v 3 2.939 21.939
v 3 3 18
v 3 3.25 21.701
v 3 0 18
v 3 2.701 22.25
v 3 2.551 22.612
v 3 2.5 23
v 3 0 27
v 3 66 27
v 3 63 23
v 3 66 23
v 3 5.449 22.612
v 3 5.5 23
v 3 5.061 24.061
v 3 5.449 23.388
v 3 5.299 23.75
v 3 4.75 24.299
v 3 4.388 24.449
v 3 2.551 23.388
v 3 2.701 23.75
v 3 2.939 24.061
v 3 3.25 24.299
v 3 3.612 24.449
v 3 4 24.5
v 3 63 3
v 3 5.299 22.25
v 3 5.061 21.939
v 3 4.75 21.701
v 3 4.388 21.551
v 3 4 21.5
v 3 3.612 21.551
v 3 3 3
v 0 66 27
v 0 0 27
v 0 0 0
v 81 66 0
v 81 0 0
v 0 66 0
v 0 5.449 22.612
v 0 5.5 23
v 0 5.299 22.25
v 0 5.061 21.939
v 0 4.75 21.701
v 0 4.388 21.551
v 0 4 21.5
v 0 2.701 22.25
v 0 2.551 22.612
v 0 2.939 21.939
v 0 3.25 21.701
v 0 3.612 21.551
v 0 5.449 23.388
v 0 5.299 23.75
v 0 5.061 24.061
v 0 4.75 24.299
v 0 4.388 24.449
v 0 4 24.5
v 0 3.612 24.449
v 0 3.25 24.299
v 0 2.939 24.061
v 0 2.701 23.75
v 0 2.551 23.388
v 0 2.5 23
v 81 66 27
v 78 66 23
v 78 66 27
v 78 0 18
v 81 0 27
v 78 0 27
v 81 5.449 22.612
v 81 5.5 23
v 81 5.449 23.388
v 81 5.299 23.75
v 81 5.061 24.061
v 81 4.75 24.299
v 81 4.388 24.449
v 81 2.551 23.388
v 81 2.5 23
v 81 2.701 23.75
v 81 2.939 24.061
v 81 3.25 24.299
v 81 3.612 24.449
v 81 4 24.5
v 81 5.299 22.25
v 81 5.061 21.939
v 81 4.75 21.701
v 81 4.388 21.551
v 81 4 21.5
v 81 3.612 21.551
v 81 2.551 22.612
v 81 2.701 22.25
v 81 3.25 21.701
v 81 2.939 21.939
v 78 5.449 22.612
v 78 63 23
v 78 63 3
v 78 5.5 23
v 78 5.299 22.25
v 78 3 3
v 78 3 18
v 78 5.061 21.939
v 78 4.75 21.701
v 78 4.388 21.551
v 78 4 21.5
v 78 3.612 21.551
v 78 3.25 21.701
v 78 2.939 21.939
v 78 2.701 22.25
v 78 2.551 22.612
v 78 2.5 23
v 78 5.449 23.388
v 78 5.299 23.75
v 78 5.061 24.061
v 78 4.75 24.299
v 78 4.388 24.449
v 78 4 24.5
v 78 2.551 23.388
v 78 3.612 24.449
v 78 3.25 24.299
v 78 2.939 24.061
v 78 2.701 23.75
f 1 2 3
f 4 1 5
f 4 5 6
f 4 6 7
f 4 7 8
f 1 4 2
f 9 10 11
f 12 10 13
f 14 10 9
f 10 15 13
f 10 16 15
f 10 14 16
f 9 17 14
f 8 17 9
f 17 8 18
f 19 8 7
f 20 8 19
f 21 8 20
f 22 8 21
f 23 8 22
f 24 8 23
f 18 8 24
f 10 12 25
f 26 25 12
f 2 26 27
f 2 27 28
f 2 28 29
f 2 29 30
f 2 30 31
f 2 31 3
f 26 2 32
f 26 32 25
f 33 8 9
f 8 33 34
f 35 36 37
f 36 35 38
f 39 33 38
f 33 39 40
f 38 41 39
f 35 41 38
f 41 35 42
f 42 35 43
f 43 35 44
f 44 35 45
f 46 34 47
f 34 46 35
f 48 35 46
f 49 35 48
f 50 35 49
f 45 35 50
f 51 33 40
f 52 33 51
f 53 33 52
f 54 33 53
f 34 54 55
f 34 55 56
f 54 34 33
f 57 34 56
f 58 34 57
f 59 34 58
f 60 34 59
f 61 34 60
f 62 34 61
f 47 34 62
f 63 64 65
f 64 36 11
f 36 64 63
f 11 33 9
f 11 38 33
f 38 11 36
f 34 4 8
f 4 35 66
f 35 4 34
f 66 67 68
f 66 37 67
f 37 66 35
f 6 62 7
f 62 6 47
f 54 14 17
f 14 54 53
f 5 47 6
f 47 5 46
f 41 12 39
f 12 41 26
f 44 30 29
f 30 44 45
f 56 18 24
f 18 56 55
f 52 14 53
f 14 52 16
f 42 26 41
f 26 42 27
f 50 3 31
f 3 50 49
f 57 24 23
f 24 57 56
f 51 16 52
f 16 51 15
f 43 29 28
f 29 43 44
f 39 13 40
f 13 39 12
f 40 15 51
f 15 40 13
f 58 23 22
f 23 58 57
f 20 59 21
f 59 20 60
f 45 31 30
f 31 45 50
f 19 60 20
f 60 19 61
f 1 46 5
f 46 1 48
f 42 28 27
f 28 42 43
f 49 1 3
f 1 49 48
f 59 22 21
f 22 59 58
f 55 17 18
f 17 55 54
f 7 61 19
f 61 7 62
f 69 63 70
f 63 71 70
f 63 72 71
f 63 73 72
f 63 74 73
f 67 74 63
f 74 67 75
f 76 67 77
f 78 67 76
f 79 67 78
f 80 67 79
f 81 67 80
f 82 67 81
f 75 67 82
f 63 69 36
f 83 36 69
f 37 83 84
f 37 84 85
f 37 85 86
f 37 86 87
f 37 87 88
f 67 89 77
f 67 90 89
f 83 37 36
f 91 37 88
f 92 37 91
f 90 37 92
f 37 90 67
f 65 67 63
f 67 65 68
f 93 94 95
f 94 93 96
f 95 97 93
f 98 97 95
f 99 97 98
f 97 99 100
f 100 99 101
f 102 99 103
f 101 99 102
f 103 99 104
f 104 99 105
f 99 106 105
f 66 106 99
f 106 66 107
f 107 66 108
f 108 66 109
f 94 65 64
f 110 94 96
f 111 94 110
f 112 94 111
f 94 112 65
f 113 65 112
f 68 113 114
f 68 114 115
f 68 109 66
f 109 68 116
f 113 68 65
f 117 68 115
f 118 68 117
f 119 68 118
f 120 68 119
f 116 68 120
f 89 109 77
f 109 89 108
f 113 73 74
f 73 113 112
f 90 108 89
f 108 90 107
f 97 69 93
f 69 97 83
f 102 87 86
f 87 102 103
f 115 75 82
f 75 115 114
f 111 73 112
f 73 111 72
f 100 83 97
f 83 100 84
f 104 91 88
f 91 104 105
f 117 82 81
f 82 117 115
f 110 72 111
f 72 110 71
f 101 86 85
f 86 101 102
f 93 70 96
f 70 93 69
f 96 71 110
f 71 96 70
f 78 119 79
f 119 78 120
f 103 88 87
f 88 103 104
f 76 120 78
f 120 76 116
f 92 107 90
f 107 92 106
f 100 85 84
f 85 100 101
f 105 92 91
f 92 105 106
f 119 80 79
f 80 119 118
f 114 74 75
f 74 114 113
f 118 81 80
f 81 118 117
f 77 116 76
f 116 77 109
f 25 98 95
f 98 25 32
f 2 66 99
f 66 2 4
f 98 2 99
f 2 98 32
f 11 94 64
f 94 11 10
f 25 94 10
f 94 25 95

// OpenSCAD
width = 75;
length = 60;

cube([width+6, length+6, 3]);
cube([width+6, 3, 18]);
translate([0, length+3, 0]) cube([width+6, 3, 18+5]);
difference() {
    cube([3, length+6, 18+5+4]);
    translate([0, 4, 18+5]) rotate([0, 90, 0]) cylinder(h=3, r=1.5);
}
difference() {
    translate([width+3, 0, 0]) cube([3, length+6, 18+5+4]);
    translate([width+3, 4, 18+5]) rotate([0, 90, 0]) cylinder(h=3, r=1.5);
}
$fa = 1;
$fs = 0.4;
